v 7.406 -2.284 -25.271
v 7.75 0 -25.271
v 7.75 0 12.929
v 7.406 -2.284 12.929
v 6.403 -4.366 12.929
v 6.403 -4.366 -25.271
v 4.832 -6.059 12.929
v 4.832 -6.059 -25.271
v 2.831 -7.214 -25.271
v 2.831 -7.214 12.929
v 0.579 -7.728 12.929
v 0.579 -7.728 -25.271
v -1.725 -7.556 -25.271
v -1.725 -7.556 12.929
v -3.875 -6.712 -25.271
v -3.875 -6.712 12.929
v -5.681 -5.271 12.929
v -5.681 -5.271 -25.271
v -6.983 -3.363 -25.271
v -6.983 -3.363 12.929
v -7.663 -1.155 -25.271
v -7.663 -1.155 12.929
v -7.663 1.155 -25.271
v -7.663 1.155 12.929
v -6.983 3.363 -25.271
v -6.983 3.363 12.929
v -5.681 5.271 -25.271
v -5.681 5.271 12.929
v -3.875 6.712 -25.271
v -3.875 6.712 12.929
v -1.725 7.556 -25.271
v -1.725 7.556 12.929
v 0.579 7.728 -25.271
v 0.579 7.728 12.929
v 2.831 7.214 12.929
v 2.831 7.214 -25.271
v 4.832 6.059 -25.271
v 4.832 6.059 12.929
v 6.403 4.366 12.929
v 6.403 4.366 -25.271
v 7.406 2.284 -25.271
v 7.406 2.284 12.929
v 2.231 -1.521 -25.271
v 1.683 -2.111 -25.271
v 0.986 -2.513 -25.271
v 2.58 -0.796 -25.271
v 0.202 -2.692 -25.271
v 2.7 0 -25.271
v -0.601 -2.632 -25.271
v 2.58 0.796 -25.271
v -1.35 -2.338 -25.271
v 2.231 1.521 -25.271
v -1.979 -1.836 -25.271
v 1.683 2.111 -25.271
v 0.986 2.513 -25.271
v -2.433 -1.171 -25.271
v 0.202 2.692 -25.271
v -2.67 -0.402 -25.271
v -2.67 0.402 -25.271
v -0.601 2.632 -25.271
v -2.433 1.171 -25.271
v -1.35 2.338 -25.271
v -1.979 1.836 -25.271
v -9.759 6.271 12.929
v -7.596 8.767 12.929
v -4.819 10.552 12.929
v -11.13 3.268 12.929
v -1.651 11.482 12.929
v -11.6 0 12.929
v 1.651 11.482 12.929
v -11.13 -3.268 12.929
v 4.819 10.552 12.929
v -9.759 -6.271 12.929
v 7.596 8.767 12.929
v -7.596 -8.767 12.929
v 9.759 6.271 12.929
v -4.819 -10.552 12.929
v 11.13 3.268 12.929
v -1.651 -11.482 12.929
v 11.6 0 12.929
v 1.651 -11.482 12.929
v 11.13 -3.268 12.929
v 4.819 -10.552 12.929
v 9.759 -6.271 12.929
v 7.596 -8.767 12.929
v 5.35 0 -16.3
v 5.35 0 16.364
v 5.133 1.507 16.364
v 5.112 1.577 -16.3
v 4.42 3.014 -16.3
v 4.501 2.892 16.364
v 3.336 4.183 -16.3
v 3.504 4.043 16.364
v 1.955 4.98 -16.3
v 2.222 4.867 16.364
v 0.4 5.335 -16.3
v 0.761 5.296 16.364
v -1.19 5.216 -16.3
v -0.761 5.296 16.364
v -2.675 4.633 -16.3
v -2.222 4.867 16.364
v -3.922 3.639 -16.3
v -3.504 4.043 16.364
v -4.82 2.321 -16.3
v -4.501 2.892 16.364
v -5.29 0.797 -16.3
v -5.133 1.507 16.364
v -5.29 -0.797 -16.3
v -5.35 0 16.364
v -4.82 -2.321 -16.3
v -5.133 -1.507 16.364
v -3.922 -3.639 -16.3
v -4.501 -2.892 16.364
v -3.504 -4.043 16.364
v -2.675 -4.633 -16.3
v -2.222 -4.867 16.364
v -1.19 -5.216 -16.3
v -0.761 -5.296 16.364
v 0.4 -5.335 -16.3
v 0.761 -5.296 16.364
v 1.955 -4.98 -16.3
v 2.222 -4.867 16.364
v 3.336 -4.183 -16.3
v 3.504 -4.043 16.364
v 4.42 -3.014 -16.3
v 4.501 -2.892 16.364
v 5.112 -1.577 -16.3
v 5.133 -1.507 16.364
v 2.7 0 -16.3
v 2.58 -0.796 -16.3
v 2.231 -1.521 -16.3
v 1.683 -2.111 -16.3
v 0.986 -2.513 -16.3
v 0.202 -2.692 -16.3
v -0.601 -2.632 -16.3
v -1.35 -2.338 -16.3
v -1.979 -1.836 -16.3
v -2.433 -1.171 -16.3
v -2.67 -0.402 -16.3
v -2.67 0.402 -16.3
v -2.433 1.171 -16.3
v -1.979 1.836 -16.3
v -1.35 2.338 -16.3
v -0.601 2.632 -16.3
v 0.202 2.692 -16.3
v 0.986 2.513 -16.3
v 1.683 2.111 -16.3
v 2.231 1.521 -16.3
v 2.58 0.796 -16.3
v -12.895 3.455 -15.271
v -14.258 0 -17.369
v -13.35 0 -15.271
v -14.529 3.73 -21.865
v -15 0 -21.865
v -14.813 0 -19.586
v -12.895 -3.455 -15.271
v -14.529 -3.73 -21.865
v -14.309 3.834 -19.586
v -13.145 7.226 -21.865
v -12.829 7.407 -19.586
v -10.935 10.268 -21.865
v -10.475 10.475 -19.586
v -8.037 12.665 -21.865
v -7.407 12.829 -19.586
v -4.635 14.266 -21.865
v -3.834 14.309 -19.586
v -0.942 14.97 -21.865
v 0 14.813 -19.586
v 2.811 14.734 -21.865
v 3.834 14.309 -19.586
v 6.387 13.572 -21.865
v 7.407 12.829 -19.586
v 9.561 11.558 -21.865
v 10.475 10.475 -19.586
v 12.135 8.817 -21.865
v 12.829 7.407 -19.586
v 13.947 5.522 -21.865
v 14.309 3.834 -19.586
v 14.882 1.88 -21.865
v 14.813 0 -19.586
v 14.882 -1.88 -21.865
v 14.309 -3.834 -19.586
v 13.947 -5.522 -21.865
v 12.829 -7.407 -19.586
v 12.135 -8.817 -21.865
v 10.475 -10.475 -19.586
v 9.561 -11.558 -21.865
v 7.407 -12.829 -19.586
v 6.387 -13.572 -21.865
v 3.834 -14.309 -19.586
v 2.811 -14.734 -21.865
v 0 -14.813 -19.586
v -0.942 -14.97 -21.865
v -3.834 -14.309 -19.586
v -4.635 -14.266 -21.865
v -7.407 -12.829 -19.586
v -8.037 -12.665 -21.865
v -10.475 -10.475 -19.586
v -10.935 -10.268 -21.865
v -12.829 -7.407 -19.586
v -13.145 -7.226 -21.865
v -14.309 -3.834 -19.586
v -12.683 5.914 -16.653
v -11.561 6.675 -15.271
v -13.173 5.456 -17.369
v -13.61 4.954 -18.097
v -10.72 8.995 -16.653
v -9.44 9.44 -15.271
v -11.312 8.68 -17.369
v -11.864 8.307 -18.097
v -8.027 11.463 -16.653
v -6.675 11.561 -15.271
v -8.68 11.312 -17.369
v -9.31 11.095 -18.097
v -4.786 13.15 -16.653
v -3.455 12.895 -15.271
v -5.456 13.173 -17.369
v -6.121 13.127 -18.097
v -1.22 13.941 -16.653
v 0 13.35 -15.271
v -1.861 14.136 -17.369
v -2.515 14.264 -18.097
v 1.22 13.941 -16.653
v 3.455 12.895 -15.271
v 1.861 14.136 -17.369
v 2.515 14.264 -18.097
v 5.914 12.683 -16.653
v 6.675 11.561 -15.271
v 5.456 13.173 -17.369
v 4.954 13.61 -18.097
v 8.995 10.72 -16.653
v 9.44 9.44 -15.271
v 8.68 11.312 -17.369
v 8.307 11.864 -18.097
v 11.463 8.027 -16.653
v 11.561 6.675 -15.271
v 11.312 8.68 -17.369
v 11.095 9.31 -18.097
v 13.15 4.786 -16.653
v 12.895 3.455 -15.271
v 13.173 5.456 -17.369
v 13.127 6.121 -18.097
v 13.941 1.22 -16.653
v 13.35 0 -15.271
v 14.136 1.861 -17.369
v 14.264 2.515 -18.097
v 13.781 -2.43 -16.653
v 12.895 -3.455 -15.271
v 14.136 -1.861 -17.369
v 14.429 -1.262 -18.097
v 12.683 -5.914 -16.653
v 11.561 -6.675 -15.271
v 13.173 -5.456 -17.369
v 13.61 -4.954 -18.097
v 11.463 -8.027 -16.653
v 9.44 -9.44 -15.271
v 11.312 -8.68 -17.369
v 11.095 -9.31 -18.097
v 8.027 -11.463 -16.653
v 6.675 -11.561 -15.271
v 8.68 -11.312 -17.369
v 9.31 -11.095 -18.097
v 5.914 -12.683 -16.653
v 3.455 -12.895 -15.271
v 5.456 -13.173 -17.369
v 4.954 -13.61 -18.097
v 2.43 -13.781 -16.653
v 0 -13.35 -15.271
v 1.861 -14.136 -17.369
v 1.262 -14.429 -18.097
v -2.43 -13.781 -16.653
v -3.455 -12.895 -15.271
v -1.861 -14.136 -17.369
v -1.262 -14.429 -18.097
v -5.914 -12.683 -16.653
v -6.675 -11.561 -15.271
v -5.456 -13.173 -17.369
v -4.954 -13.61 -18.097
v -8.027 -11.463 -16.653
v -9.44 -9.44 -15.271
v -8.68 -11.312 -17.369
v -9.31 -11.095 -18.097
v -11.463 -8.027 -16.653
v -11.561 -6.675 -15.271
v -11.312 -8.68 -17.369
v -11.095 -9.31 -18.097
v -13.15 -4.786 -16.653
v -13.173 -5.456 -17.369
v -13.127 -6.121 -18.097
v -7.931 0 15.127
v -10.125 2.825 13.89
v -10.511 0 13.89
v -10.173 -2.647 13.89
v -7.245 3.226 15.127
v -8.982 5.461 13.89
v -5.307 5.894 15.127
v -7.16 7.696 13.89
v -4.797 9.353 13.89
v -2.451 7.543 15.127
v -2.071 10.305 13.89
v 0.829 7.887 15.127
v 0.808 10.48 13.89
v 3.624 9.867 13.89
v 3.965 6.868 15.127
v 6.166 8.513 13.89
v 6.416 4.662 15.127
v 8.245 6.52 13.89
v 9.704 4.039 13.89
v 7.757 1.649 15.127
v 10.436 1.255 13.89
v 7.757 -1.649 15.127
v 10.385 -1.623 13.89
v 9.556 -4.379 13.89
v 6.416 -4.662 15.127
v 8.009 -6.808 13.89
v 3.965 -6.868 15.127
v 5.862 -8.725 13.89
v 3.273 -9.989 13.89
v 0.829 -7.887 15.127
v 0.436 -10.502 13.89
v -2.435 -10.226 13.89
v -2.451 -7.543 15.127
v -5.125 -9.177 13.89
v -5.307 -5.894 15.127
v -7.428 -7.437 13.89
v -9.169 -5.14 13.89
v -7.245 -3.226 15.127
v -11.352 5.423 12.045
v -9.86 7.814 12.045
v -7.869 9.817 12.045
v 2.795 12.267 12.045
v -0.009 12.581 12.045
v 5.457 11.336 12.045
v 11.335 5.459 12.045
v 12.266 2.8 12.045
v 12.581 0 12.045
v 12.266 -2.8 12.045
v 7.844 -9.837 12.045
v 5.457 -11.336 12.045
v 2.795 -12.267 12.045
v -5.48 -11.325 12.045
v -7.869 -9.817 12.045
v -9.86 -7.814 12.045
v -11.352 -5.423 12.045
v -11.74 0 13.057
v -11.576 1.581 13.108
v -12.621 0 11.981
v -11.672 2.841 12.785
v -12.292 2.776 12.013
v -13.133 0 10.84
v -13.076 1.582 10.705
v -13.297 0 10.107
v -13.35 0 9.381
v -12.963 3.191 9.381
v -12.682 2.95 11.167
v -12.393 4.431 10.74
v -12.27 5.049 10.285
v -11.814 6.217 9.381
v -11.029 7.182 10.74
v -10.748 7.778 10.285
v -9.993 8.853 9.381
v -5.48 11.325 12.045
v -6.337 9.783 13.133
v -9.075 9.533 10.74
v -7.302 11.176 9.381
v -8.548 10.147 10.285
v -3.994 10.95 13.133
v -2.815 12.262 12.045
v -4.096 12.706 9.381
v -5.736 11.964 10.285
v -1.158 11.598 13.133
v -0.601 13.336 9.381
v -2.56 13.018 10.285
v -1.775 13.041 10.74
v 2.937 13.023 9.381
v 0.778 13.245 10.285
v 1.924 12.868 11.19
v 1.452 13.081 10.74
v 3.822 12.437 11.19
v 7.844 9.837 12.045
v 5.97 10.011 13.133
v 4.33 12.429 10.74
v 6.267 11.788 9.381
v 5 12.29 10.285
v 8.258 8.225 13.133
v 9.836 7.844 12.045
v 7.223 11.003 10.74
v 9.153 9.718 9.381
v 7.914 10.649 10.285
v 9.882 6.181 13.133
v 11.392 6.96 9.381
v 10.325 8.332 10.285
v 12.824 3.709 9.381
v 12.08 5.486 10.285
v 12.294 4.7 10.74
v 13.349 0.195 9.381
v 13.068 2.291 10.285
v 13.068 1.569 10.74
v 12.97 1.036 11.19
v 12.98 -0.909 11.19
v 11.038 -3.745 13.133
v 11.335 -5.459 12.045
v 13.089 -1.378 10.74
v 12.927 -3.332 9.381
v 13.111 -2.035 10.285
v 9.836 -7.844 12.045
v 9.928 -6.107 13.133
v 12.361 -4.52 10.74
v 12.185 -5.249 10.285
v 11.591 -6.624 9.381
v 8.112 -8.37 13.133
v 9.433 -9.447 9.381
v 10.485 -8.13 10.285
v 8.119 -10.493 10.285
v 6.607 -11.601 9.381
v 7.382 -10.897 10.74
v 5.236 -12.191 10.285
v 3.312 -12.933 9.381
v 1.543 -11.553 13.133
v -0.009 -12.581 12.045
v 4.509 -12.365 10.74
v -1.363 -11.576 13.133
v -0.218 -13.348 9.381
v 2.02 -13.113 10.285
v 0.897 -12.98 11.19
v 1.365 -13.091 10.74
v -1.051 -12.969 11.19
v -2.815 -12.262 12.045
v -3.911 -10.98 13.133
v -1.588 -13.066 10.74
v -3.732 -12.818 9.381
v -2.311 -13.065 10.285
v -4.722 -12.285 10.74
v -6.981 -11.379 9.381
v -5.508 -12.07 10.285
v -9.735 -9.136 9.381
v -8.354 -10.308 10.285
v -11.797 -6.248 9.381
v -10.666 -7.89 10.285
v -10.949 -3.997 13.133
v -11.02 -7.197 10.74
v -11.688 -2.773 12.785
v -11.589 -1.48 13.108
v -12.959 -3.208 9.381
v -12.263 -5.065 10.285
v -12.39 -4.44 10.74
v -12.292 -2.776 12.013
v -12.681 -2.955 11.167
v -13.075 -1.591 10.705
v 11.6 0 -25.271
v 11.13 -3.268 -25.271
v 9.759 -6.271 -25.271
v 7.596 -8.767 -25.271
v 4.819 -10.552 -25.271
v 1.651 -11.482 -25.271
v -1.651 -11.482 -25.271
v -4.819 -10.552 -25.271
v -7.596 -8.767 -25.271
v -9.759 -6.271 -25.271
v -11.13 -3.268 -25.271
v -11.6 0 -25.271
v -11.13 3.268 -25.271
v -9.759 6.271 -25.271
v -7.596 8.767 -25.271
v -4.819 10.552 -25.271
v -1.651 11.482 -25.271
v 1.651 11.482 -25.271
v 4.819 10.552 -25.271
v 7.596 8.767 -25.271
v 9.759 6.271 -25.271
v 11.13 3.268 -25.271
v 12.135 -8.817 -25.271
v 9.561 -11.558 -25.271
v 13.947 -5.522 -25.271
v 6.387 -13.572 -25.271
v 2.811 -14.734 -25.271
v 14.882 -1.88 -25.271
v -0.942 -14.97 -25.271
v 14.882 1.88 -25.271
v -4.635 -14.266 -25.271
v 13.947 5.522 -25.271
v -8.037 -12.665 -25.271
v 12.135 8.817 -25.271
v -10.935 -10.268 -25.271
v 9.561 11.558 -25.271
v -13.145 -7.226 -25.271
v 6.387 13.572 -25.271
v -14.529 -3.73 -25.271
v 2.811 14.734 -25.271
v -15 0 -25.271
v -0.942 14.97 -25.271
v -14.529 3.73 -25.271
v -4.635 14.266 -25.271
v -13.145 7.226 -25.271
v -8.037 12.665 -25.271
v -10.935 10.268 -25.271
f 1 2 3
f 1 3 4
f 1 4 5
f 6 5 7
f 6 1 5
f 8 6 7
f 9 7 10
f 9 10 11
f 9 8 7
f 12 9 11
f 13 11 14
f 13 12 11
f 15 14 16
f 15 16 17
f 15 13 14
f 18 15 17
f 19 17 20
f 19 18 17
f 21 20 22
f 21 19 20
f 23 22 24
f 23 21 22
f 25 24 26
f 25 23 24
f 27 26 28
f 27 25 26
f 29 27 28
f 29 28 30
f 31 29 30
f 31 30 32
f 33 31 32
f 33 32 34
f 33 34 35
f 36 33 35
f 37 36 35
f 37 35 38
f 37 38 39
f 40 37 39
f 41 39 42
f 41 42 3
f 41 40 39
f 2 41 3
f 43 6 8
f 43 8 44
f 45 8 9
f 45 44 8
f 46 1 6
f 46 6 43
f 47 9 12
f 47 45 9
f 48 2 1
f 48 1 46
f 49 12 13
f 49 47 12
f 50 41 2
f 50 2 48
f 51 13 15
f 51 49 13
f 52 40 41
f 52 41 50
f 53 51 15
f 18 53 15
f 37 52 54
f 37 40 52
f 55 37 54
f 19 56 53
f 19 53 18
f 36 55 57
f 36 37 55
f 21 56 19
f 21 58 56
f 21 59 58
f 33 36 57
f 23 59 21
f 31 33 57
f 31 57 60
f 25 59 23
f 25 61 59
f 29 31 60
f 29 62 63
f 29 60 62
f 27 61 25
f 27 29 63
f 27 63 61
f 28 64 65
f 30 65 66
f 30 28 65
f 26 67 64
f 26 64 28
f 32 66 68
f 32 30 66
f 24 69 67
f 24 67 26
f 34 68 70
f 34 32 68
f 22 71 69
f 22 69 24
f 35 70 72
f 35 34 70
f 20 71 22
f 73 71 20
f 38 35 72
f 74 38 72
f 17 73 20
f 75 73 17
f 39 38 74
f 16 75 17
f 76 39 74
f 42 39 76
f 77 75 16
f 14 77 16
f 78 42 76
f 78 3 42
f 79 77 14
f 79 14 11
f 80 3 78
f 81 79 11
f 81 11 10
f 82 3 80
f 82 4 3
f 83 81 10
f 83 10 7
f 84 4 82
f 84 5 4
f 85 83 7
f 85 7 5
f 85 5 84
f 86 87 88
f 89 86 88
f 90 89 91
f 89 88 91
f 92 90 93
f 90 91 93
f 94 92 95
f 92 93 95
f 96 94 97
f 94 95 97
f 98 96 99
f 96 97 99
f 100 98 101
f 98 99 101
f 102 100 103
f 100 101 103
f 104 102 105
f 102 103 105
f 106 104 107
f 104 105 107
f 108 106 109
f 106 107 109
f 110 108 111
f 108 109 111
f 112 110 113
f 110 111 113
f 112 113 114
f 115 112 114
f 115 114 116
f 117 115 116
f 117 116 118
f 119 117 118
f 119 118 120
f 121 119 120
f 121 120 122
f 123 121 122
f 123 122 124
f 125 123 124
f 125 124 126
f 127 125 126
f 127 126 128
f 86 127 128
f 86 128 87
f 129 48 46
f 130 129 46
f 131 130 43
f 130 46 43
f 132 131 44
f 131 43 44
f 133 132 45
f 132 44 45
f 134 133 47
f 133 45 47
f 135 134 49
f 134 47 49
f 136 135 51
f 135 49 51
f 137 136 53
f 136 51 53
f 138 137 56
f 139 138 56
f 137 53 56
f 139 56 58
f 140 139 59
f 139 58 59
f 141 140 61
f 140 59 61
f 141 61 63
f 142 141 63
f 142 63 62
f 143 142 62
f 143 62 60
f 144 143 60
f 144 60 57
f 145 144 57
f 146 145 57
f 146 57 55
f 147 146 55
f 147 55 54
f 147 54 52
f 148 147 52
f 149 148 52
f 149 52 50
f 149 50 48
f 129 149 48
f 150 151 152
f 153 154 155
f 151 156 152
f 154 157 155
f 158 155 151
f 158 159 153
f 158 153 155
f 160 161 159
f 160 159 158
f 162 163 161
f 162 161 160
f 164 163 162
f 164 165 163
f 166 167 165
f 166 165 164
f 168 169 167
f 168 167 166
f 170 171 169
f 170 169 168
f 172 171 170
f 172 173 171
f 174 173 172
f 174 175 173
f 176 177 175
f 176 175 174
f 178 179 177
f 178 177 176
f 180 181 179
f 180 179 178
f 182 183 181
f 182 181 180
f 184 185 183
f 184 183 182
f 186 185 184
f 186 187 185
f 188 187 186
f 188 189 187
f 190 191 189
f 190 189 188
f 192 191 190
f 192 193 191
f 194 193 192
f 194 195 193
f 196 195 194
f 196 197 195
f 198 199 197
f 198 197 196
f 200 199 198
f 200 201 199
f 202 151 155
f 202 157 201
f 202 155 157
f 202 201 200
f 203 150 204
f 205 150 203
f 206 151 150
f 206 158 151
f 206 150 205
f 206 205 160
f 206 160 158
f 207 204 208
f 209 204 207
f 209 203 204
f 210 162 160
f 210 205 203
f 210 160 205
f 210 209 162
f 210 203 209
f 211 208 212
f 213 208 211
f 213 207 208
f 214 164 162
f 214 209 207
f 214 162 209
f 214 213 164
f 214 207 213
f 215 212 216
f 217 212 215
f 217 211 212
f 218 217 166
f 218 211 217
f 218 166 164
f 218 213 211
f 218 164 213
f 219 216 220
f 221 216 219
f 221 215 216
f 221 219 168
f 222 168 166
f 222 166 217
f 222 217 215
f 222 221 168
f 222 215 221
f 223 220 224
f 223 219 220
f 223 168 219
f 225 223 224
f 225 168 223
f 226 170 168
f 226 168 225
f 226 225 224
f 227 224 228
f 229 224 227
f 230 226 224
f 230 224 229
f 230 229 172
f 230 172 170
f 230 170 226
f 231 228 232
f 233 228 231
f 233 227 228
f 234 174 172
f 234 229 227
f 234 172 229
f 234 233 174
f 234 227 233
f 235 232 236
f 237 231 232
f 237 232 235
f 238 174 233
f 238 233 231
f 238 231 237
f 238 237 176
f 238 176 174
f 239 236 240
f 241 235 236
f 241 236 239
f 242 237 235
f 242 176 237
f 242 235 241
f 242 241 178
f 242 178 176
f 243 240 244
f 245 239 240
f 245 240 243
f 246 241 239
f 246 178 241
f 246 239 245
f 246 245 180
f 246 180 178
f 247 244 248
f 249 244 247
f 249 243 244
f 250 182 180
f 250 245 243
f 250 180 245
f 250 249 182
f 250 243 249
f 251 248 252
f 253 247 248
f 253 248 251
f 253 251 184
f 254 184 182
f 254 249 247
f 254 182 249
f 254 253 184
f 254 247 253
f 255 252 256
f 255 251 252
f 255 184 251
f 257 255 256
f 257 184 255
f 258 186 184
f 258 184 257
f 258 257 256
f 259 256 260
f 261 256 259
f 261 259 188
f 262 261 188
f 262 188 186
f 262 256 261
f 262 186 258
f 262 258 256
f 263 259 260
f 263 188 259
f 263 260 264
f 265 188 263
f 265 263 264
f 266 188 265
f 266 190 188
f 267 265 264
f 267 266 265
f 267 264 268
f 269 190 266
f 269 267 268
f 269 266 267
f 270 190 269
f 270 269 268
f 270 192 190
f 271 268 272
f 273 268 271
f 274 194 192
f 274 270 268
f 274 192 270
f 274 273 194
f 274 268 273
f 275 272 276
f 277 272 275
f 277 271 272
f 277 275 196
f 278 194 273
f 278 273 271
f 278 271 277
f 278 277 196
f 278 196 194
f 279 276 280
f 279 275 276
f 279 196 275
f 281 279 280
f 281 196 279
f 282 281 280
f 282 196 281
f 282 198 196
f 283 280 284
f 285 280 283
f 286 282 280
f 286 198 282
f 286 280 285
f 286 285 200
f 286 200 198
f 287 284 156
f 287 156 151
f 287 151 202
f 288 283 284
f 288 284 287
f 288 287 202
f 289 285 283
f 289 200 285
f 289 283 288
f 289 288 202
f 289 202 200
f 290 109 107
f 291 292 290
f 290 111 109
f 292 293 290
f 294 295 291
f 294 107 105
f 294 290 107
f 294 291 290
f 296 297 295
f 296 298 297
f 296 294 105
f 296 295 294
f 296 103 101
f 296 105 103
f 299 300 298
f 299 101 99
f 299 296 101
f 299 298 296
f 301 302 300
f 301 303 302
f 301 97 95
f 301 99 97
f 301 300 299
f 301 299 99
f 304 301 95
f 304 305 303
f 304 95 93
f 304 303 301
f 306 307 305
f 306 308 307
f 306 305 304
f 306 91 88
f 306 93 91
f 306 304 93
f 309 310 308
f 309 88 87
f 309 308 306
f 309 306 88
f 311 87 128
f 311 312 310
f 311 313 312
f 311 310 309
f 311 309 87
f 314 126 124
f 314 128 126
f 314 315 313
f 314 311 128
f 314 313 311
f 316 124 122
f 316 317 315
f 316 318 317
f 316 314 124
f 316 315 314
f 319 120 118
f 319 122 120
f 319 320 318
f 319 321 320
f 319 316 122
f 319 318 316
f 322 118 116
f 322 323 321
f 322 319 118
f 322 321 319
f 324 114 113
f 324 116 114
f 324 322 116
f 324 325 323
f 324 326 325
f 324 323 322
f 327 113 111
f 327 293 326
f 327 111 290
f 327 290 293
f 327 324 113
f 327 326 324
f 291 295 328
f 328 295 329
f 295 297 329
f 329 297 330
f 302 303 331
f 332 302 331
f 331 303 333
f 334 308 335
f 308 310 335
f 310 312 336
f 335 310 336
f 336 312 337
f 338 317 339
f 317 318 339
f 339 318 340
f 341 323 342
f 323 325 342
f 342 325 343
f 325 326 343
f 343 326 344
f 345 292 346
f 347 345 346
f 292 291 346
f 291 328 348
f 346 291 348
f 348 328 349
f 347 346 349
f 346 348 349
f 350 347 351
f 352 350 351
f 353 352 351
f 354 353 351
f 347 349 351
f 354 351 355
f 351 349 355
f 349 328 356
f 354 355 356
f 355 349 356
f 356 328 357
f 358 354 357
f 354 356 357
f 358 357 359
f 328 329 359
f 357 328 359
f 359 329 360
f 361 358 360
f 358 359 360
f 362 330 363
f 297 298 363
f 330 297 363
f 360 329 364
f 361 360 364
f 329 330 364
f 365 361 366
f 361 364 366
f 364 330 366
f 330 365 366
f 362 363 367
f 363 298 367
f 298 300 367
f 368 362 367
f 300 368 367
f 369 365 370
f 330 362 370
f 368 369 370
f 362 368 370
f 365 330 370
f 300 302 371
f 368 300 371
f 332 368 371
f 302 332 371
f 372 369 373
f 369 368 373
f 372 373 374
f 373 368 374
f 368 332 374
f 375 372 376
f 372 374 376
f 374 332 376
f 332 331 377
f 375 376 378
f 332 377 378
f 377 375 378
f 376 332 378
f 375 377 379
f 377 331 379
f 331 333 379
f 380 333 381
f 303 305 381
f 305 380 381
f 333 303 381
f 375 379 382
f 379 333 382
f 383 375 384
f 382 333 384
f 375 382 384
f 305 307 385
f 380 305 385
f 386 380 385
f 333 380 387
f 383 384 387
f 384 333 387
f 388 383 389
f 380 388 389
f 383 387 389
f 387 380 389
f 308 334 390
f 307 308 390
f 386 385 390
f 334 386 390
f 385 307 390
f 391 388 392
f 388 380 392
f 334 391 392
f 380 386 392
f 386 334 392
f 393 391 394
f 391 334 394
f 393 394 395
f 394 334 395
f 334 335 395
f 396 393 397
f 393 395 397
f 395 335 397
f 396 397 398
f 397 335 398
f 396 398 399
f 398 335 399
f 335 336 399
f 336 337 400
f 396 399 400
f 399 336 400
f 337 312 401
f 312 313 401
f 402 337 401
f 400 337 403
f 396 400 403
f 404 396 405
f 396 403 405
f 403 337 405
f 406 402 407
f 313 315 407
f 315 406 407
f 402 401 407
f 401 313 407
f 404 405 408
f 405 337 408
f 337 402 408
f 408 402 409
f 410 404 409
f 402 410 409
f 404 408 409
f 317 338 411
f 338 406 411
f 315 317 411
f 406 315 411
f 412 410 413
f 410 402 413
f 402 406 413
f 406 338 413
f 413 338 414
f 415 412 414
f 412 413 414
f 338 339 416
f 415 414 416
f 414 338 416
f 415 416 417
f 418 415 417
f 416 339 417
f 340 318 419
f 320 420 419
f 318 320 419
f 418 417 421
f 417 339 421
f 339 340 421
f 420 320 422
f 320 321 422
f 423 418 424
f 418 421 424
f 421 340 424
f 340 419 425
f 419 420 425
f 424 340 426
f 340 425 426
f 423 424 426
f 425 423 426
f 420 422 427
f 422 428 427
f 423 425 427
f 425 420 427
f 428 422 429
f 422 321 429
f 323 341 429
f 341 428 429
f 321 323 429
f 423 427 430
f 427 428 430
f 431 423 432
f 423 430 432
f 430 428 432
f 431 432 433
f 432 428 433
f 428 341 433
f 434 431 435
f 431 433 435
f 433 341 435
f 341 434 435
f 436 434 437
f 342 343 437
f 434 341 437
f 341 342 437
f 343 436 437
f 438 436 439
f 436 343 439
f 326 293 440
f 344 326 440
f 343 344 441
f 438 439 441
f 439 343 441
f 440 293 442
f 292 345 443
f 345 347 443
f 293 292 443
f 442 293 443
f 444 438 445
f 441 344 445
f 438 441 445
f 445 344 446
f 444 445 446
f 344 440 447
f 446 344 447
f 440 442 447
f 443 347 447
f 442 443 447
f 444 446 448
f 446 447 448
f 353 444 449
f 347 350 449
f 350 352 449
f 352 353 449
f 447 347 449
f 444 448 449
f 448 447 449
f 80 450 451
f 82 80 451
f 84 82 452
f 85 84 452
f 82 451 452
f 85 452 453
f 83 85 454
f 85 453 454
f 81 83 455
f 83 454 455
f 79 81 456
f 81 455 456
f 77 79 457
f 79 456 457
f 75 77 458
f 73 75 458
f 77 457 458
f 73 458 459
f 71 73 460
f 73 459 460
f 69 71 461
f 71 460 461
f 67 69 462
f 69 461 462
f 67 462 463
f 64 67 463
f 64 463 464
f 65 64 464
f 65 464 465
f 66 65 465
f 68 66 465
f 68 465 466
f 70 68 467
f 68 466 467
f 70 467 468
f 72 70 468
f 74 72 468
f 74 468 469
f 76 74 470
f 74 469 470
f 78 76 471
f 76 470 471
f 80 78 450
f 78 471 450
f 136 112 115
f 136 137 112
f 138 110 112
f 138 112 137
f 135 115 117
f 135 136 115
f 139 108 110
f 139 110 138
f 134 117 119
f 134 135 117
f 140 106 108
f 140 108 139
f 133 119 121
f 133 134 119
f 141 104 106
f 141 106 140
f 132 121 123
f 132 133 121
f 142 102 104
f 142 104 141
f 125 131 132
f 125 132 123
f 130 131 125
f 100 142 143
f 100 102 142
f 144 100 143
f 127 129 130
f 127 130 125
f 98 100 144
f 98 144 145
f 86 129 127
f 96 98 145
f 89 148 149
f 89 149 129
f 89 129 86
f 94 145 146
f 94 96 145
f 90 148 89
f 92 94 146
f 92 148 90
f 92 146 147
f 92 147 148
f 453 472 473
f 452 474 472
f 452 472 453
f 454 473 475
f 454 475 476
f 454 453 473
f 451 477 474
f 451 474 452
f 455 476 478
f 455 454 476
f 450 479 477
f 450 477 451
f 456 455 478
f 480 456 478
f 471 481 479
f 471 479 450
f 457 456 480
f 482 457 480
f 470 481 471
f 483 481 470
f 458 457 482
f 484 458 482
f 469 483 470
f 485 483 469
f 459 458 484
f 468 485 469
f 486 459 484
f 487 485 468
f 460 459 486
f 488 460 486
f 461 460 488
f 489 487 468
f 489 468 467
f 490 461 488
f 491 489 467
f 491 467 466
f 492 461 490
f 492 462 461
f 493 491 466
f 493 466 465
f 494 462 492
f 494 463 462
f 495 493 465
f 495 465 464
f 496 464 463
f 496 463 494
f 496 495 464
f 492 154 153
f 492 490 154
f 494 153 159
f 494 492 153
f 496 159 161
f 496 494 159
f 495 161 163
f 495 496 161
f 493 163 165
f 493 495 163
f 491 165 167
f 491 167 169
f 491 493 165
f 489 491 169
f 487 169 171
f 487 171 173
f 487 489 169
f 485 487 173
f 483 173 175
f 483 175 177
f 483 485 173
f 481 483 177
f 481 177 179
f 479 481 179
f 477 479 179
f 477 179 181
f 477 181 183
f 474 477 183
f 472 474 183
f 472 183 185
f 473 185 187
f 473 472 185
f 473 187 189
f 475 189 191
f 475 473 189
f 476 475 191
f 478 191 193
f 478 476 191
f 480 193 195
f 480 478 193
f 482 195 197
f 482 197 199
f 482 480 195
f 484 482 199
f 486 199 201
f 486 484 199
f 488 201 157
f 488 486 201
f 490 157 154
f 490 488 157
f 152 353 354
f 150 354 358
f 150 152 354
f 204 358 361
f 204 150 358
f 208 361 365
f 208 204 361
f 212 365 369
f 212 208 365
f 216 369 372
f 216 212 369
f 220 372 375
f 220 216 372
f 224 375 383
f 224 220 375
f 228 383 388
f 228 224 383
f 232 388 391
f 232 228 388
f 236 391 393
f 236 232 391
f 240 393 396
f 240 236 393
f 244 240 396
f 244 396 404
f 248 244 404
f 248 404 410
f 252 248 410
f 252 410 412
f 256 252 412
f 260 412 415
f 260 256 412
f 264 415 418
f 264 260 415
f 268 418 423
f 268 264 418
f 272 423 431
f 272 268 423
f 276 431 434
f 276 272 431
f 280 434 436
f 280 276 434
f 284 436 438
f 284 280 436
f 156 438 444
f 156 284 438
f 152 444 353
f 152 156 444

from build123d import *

# Parameters (mm, degrees)
F2_R     = 2.7
F3_DEPTH = 44.201
F4_R     = 11.6
F4_R_2   = 7.75
F5_DEPTH = 38.2
F6_R     = 5
F8_R     = 5.35
F9_DEPTH = 34.1


# Not quite as in the source:
# - a fillet or chamfer that OpenCascade refuses, or shapes differently, is made with other operations: its cross-section is extruded or revolved along the edge and cut away or added


with BuildPart() as f1:
    # F0 (on Front) → F1 (revolve)
    with BuildSketch(Plane.XZ):
        Polygon((0, -25.2708706191), (0, 18.9291293809), (-13.35, 12.5291293809), (-13.35, -15.2708706191), (-15, -15.2708706191), (-15, -25.2708706191), align=None)
    revolve(axis=Axis((0, 0, -3.1708706191), (0, 0, -1)))

    # F2 (on face) → F3 (cut, through all)
    with BuildSketch(Plane(origin=(0, 0, -25.2708706191), x_dir=(1, 0, 0), z_dir=(0, 0, -1))):
        Circle(F2_R)
    extrude(amount=-F3_DEPTH, mode=Mode.SUBTRACT)

    # F4 (on face) → F5 (cut)
    with BuildSketch(Plane(origin=(0, 0, -25.2708706191), x_dir=(1, 0, 0), z_dir=(0, 0, -1))):
        Circle(F4_R)
        Circle(F4_R_2, mode=Mode.SUBTRACT)
    extrude(amount=-F5_DEPTH, mode=Mode.SUBTRACT)

    # F6
    f6_edges = [f1.edges().sort_by_distance(p)[0] for p in [
        (13.35, 0, 12.529129),
    ]]
    fillet(f6_edges, radius=F6_R)

    # F8 (on offset) → F9 (cut)
    with BuildSketch(Plane.XY.offset(17.8)):
        Circle(F8_R)
    extrude(amount=-F9_DEPTH, mode=Mode.SUBTRACT)

    # F10: fillet of radius 14 on 1 edges, made by hand

    # F10_s1 → F10_t2 (revolve, cut)
    with BuildSketch(Plane.XZ):
        with BuildLine():
            ThreePointArc((-13.35, -15.2708706191), (-14.5812370571, -18.4660885634), (-15, -21.864617657))
            Line((-15, -21.864617657), (-15, -15.2708706191))
            Line((-15, -15.2708706191), (-13.35, -15.2708706191))
        make_face()
    revolve(axis=Axis((0, 0, -15.2708706191), (0, 0, -1)), mode=Mode.SUBTRACT)


solid = f1.part
